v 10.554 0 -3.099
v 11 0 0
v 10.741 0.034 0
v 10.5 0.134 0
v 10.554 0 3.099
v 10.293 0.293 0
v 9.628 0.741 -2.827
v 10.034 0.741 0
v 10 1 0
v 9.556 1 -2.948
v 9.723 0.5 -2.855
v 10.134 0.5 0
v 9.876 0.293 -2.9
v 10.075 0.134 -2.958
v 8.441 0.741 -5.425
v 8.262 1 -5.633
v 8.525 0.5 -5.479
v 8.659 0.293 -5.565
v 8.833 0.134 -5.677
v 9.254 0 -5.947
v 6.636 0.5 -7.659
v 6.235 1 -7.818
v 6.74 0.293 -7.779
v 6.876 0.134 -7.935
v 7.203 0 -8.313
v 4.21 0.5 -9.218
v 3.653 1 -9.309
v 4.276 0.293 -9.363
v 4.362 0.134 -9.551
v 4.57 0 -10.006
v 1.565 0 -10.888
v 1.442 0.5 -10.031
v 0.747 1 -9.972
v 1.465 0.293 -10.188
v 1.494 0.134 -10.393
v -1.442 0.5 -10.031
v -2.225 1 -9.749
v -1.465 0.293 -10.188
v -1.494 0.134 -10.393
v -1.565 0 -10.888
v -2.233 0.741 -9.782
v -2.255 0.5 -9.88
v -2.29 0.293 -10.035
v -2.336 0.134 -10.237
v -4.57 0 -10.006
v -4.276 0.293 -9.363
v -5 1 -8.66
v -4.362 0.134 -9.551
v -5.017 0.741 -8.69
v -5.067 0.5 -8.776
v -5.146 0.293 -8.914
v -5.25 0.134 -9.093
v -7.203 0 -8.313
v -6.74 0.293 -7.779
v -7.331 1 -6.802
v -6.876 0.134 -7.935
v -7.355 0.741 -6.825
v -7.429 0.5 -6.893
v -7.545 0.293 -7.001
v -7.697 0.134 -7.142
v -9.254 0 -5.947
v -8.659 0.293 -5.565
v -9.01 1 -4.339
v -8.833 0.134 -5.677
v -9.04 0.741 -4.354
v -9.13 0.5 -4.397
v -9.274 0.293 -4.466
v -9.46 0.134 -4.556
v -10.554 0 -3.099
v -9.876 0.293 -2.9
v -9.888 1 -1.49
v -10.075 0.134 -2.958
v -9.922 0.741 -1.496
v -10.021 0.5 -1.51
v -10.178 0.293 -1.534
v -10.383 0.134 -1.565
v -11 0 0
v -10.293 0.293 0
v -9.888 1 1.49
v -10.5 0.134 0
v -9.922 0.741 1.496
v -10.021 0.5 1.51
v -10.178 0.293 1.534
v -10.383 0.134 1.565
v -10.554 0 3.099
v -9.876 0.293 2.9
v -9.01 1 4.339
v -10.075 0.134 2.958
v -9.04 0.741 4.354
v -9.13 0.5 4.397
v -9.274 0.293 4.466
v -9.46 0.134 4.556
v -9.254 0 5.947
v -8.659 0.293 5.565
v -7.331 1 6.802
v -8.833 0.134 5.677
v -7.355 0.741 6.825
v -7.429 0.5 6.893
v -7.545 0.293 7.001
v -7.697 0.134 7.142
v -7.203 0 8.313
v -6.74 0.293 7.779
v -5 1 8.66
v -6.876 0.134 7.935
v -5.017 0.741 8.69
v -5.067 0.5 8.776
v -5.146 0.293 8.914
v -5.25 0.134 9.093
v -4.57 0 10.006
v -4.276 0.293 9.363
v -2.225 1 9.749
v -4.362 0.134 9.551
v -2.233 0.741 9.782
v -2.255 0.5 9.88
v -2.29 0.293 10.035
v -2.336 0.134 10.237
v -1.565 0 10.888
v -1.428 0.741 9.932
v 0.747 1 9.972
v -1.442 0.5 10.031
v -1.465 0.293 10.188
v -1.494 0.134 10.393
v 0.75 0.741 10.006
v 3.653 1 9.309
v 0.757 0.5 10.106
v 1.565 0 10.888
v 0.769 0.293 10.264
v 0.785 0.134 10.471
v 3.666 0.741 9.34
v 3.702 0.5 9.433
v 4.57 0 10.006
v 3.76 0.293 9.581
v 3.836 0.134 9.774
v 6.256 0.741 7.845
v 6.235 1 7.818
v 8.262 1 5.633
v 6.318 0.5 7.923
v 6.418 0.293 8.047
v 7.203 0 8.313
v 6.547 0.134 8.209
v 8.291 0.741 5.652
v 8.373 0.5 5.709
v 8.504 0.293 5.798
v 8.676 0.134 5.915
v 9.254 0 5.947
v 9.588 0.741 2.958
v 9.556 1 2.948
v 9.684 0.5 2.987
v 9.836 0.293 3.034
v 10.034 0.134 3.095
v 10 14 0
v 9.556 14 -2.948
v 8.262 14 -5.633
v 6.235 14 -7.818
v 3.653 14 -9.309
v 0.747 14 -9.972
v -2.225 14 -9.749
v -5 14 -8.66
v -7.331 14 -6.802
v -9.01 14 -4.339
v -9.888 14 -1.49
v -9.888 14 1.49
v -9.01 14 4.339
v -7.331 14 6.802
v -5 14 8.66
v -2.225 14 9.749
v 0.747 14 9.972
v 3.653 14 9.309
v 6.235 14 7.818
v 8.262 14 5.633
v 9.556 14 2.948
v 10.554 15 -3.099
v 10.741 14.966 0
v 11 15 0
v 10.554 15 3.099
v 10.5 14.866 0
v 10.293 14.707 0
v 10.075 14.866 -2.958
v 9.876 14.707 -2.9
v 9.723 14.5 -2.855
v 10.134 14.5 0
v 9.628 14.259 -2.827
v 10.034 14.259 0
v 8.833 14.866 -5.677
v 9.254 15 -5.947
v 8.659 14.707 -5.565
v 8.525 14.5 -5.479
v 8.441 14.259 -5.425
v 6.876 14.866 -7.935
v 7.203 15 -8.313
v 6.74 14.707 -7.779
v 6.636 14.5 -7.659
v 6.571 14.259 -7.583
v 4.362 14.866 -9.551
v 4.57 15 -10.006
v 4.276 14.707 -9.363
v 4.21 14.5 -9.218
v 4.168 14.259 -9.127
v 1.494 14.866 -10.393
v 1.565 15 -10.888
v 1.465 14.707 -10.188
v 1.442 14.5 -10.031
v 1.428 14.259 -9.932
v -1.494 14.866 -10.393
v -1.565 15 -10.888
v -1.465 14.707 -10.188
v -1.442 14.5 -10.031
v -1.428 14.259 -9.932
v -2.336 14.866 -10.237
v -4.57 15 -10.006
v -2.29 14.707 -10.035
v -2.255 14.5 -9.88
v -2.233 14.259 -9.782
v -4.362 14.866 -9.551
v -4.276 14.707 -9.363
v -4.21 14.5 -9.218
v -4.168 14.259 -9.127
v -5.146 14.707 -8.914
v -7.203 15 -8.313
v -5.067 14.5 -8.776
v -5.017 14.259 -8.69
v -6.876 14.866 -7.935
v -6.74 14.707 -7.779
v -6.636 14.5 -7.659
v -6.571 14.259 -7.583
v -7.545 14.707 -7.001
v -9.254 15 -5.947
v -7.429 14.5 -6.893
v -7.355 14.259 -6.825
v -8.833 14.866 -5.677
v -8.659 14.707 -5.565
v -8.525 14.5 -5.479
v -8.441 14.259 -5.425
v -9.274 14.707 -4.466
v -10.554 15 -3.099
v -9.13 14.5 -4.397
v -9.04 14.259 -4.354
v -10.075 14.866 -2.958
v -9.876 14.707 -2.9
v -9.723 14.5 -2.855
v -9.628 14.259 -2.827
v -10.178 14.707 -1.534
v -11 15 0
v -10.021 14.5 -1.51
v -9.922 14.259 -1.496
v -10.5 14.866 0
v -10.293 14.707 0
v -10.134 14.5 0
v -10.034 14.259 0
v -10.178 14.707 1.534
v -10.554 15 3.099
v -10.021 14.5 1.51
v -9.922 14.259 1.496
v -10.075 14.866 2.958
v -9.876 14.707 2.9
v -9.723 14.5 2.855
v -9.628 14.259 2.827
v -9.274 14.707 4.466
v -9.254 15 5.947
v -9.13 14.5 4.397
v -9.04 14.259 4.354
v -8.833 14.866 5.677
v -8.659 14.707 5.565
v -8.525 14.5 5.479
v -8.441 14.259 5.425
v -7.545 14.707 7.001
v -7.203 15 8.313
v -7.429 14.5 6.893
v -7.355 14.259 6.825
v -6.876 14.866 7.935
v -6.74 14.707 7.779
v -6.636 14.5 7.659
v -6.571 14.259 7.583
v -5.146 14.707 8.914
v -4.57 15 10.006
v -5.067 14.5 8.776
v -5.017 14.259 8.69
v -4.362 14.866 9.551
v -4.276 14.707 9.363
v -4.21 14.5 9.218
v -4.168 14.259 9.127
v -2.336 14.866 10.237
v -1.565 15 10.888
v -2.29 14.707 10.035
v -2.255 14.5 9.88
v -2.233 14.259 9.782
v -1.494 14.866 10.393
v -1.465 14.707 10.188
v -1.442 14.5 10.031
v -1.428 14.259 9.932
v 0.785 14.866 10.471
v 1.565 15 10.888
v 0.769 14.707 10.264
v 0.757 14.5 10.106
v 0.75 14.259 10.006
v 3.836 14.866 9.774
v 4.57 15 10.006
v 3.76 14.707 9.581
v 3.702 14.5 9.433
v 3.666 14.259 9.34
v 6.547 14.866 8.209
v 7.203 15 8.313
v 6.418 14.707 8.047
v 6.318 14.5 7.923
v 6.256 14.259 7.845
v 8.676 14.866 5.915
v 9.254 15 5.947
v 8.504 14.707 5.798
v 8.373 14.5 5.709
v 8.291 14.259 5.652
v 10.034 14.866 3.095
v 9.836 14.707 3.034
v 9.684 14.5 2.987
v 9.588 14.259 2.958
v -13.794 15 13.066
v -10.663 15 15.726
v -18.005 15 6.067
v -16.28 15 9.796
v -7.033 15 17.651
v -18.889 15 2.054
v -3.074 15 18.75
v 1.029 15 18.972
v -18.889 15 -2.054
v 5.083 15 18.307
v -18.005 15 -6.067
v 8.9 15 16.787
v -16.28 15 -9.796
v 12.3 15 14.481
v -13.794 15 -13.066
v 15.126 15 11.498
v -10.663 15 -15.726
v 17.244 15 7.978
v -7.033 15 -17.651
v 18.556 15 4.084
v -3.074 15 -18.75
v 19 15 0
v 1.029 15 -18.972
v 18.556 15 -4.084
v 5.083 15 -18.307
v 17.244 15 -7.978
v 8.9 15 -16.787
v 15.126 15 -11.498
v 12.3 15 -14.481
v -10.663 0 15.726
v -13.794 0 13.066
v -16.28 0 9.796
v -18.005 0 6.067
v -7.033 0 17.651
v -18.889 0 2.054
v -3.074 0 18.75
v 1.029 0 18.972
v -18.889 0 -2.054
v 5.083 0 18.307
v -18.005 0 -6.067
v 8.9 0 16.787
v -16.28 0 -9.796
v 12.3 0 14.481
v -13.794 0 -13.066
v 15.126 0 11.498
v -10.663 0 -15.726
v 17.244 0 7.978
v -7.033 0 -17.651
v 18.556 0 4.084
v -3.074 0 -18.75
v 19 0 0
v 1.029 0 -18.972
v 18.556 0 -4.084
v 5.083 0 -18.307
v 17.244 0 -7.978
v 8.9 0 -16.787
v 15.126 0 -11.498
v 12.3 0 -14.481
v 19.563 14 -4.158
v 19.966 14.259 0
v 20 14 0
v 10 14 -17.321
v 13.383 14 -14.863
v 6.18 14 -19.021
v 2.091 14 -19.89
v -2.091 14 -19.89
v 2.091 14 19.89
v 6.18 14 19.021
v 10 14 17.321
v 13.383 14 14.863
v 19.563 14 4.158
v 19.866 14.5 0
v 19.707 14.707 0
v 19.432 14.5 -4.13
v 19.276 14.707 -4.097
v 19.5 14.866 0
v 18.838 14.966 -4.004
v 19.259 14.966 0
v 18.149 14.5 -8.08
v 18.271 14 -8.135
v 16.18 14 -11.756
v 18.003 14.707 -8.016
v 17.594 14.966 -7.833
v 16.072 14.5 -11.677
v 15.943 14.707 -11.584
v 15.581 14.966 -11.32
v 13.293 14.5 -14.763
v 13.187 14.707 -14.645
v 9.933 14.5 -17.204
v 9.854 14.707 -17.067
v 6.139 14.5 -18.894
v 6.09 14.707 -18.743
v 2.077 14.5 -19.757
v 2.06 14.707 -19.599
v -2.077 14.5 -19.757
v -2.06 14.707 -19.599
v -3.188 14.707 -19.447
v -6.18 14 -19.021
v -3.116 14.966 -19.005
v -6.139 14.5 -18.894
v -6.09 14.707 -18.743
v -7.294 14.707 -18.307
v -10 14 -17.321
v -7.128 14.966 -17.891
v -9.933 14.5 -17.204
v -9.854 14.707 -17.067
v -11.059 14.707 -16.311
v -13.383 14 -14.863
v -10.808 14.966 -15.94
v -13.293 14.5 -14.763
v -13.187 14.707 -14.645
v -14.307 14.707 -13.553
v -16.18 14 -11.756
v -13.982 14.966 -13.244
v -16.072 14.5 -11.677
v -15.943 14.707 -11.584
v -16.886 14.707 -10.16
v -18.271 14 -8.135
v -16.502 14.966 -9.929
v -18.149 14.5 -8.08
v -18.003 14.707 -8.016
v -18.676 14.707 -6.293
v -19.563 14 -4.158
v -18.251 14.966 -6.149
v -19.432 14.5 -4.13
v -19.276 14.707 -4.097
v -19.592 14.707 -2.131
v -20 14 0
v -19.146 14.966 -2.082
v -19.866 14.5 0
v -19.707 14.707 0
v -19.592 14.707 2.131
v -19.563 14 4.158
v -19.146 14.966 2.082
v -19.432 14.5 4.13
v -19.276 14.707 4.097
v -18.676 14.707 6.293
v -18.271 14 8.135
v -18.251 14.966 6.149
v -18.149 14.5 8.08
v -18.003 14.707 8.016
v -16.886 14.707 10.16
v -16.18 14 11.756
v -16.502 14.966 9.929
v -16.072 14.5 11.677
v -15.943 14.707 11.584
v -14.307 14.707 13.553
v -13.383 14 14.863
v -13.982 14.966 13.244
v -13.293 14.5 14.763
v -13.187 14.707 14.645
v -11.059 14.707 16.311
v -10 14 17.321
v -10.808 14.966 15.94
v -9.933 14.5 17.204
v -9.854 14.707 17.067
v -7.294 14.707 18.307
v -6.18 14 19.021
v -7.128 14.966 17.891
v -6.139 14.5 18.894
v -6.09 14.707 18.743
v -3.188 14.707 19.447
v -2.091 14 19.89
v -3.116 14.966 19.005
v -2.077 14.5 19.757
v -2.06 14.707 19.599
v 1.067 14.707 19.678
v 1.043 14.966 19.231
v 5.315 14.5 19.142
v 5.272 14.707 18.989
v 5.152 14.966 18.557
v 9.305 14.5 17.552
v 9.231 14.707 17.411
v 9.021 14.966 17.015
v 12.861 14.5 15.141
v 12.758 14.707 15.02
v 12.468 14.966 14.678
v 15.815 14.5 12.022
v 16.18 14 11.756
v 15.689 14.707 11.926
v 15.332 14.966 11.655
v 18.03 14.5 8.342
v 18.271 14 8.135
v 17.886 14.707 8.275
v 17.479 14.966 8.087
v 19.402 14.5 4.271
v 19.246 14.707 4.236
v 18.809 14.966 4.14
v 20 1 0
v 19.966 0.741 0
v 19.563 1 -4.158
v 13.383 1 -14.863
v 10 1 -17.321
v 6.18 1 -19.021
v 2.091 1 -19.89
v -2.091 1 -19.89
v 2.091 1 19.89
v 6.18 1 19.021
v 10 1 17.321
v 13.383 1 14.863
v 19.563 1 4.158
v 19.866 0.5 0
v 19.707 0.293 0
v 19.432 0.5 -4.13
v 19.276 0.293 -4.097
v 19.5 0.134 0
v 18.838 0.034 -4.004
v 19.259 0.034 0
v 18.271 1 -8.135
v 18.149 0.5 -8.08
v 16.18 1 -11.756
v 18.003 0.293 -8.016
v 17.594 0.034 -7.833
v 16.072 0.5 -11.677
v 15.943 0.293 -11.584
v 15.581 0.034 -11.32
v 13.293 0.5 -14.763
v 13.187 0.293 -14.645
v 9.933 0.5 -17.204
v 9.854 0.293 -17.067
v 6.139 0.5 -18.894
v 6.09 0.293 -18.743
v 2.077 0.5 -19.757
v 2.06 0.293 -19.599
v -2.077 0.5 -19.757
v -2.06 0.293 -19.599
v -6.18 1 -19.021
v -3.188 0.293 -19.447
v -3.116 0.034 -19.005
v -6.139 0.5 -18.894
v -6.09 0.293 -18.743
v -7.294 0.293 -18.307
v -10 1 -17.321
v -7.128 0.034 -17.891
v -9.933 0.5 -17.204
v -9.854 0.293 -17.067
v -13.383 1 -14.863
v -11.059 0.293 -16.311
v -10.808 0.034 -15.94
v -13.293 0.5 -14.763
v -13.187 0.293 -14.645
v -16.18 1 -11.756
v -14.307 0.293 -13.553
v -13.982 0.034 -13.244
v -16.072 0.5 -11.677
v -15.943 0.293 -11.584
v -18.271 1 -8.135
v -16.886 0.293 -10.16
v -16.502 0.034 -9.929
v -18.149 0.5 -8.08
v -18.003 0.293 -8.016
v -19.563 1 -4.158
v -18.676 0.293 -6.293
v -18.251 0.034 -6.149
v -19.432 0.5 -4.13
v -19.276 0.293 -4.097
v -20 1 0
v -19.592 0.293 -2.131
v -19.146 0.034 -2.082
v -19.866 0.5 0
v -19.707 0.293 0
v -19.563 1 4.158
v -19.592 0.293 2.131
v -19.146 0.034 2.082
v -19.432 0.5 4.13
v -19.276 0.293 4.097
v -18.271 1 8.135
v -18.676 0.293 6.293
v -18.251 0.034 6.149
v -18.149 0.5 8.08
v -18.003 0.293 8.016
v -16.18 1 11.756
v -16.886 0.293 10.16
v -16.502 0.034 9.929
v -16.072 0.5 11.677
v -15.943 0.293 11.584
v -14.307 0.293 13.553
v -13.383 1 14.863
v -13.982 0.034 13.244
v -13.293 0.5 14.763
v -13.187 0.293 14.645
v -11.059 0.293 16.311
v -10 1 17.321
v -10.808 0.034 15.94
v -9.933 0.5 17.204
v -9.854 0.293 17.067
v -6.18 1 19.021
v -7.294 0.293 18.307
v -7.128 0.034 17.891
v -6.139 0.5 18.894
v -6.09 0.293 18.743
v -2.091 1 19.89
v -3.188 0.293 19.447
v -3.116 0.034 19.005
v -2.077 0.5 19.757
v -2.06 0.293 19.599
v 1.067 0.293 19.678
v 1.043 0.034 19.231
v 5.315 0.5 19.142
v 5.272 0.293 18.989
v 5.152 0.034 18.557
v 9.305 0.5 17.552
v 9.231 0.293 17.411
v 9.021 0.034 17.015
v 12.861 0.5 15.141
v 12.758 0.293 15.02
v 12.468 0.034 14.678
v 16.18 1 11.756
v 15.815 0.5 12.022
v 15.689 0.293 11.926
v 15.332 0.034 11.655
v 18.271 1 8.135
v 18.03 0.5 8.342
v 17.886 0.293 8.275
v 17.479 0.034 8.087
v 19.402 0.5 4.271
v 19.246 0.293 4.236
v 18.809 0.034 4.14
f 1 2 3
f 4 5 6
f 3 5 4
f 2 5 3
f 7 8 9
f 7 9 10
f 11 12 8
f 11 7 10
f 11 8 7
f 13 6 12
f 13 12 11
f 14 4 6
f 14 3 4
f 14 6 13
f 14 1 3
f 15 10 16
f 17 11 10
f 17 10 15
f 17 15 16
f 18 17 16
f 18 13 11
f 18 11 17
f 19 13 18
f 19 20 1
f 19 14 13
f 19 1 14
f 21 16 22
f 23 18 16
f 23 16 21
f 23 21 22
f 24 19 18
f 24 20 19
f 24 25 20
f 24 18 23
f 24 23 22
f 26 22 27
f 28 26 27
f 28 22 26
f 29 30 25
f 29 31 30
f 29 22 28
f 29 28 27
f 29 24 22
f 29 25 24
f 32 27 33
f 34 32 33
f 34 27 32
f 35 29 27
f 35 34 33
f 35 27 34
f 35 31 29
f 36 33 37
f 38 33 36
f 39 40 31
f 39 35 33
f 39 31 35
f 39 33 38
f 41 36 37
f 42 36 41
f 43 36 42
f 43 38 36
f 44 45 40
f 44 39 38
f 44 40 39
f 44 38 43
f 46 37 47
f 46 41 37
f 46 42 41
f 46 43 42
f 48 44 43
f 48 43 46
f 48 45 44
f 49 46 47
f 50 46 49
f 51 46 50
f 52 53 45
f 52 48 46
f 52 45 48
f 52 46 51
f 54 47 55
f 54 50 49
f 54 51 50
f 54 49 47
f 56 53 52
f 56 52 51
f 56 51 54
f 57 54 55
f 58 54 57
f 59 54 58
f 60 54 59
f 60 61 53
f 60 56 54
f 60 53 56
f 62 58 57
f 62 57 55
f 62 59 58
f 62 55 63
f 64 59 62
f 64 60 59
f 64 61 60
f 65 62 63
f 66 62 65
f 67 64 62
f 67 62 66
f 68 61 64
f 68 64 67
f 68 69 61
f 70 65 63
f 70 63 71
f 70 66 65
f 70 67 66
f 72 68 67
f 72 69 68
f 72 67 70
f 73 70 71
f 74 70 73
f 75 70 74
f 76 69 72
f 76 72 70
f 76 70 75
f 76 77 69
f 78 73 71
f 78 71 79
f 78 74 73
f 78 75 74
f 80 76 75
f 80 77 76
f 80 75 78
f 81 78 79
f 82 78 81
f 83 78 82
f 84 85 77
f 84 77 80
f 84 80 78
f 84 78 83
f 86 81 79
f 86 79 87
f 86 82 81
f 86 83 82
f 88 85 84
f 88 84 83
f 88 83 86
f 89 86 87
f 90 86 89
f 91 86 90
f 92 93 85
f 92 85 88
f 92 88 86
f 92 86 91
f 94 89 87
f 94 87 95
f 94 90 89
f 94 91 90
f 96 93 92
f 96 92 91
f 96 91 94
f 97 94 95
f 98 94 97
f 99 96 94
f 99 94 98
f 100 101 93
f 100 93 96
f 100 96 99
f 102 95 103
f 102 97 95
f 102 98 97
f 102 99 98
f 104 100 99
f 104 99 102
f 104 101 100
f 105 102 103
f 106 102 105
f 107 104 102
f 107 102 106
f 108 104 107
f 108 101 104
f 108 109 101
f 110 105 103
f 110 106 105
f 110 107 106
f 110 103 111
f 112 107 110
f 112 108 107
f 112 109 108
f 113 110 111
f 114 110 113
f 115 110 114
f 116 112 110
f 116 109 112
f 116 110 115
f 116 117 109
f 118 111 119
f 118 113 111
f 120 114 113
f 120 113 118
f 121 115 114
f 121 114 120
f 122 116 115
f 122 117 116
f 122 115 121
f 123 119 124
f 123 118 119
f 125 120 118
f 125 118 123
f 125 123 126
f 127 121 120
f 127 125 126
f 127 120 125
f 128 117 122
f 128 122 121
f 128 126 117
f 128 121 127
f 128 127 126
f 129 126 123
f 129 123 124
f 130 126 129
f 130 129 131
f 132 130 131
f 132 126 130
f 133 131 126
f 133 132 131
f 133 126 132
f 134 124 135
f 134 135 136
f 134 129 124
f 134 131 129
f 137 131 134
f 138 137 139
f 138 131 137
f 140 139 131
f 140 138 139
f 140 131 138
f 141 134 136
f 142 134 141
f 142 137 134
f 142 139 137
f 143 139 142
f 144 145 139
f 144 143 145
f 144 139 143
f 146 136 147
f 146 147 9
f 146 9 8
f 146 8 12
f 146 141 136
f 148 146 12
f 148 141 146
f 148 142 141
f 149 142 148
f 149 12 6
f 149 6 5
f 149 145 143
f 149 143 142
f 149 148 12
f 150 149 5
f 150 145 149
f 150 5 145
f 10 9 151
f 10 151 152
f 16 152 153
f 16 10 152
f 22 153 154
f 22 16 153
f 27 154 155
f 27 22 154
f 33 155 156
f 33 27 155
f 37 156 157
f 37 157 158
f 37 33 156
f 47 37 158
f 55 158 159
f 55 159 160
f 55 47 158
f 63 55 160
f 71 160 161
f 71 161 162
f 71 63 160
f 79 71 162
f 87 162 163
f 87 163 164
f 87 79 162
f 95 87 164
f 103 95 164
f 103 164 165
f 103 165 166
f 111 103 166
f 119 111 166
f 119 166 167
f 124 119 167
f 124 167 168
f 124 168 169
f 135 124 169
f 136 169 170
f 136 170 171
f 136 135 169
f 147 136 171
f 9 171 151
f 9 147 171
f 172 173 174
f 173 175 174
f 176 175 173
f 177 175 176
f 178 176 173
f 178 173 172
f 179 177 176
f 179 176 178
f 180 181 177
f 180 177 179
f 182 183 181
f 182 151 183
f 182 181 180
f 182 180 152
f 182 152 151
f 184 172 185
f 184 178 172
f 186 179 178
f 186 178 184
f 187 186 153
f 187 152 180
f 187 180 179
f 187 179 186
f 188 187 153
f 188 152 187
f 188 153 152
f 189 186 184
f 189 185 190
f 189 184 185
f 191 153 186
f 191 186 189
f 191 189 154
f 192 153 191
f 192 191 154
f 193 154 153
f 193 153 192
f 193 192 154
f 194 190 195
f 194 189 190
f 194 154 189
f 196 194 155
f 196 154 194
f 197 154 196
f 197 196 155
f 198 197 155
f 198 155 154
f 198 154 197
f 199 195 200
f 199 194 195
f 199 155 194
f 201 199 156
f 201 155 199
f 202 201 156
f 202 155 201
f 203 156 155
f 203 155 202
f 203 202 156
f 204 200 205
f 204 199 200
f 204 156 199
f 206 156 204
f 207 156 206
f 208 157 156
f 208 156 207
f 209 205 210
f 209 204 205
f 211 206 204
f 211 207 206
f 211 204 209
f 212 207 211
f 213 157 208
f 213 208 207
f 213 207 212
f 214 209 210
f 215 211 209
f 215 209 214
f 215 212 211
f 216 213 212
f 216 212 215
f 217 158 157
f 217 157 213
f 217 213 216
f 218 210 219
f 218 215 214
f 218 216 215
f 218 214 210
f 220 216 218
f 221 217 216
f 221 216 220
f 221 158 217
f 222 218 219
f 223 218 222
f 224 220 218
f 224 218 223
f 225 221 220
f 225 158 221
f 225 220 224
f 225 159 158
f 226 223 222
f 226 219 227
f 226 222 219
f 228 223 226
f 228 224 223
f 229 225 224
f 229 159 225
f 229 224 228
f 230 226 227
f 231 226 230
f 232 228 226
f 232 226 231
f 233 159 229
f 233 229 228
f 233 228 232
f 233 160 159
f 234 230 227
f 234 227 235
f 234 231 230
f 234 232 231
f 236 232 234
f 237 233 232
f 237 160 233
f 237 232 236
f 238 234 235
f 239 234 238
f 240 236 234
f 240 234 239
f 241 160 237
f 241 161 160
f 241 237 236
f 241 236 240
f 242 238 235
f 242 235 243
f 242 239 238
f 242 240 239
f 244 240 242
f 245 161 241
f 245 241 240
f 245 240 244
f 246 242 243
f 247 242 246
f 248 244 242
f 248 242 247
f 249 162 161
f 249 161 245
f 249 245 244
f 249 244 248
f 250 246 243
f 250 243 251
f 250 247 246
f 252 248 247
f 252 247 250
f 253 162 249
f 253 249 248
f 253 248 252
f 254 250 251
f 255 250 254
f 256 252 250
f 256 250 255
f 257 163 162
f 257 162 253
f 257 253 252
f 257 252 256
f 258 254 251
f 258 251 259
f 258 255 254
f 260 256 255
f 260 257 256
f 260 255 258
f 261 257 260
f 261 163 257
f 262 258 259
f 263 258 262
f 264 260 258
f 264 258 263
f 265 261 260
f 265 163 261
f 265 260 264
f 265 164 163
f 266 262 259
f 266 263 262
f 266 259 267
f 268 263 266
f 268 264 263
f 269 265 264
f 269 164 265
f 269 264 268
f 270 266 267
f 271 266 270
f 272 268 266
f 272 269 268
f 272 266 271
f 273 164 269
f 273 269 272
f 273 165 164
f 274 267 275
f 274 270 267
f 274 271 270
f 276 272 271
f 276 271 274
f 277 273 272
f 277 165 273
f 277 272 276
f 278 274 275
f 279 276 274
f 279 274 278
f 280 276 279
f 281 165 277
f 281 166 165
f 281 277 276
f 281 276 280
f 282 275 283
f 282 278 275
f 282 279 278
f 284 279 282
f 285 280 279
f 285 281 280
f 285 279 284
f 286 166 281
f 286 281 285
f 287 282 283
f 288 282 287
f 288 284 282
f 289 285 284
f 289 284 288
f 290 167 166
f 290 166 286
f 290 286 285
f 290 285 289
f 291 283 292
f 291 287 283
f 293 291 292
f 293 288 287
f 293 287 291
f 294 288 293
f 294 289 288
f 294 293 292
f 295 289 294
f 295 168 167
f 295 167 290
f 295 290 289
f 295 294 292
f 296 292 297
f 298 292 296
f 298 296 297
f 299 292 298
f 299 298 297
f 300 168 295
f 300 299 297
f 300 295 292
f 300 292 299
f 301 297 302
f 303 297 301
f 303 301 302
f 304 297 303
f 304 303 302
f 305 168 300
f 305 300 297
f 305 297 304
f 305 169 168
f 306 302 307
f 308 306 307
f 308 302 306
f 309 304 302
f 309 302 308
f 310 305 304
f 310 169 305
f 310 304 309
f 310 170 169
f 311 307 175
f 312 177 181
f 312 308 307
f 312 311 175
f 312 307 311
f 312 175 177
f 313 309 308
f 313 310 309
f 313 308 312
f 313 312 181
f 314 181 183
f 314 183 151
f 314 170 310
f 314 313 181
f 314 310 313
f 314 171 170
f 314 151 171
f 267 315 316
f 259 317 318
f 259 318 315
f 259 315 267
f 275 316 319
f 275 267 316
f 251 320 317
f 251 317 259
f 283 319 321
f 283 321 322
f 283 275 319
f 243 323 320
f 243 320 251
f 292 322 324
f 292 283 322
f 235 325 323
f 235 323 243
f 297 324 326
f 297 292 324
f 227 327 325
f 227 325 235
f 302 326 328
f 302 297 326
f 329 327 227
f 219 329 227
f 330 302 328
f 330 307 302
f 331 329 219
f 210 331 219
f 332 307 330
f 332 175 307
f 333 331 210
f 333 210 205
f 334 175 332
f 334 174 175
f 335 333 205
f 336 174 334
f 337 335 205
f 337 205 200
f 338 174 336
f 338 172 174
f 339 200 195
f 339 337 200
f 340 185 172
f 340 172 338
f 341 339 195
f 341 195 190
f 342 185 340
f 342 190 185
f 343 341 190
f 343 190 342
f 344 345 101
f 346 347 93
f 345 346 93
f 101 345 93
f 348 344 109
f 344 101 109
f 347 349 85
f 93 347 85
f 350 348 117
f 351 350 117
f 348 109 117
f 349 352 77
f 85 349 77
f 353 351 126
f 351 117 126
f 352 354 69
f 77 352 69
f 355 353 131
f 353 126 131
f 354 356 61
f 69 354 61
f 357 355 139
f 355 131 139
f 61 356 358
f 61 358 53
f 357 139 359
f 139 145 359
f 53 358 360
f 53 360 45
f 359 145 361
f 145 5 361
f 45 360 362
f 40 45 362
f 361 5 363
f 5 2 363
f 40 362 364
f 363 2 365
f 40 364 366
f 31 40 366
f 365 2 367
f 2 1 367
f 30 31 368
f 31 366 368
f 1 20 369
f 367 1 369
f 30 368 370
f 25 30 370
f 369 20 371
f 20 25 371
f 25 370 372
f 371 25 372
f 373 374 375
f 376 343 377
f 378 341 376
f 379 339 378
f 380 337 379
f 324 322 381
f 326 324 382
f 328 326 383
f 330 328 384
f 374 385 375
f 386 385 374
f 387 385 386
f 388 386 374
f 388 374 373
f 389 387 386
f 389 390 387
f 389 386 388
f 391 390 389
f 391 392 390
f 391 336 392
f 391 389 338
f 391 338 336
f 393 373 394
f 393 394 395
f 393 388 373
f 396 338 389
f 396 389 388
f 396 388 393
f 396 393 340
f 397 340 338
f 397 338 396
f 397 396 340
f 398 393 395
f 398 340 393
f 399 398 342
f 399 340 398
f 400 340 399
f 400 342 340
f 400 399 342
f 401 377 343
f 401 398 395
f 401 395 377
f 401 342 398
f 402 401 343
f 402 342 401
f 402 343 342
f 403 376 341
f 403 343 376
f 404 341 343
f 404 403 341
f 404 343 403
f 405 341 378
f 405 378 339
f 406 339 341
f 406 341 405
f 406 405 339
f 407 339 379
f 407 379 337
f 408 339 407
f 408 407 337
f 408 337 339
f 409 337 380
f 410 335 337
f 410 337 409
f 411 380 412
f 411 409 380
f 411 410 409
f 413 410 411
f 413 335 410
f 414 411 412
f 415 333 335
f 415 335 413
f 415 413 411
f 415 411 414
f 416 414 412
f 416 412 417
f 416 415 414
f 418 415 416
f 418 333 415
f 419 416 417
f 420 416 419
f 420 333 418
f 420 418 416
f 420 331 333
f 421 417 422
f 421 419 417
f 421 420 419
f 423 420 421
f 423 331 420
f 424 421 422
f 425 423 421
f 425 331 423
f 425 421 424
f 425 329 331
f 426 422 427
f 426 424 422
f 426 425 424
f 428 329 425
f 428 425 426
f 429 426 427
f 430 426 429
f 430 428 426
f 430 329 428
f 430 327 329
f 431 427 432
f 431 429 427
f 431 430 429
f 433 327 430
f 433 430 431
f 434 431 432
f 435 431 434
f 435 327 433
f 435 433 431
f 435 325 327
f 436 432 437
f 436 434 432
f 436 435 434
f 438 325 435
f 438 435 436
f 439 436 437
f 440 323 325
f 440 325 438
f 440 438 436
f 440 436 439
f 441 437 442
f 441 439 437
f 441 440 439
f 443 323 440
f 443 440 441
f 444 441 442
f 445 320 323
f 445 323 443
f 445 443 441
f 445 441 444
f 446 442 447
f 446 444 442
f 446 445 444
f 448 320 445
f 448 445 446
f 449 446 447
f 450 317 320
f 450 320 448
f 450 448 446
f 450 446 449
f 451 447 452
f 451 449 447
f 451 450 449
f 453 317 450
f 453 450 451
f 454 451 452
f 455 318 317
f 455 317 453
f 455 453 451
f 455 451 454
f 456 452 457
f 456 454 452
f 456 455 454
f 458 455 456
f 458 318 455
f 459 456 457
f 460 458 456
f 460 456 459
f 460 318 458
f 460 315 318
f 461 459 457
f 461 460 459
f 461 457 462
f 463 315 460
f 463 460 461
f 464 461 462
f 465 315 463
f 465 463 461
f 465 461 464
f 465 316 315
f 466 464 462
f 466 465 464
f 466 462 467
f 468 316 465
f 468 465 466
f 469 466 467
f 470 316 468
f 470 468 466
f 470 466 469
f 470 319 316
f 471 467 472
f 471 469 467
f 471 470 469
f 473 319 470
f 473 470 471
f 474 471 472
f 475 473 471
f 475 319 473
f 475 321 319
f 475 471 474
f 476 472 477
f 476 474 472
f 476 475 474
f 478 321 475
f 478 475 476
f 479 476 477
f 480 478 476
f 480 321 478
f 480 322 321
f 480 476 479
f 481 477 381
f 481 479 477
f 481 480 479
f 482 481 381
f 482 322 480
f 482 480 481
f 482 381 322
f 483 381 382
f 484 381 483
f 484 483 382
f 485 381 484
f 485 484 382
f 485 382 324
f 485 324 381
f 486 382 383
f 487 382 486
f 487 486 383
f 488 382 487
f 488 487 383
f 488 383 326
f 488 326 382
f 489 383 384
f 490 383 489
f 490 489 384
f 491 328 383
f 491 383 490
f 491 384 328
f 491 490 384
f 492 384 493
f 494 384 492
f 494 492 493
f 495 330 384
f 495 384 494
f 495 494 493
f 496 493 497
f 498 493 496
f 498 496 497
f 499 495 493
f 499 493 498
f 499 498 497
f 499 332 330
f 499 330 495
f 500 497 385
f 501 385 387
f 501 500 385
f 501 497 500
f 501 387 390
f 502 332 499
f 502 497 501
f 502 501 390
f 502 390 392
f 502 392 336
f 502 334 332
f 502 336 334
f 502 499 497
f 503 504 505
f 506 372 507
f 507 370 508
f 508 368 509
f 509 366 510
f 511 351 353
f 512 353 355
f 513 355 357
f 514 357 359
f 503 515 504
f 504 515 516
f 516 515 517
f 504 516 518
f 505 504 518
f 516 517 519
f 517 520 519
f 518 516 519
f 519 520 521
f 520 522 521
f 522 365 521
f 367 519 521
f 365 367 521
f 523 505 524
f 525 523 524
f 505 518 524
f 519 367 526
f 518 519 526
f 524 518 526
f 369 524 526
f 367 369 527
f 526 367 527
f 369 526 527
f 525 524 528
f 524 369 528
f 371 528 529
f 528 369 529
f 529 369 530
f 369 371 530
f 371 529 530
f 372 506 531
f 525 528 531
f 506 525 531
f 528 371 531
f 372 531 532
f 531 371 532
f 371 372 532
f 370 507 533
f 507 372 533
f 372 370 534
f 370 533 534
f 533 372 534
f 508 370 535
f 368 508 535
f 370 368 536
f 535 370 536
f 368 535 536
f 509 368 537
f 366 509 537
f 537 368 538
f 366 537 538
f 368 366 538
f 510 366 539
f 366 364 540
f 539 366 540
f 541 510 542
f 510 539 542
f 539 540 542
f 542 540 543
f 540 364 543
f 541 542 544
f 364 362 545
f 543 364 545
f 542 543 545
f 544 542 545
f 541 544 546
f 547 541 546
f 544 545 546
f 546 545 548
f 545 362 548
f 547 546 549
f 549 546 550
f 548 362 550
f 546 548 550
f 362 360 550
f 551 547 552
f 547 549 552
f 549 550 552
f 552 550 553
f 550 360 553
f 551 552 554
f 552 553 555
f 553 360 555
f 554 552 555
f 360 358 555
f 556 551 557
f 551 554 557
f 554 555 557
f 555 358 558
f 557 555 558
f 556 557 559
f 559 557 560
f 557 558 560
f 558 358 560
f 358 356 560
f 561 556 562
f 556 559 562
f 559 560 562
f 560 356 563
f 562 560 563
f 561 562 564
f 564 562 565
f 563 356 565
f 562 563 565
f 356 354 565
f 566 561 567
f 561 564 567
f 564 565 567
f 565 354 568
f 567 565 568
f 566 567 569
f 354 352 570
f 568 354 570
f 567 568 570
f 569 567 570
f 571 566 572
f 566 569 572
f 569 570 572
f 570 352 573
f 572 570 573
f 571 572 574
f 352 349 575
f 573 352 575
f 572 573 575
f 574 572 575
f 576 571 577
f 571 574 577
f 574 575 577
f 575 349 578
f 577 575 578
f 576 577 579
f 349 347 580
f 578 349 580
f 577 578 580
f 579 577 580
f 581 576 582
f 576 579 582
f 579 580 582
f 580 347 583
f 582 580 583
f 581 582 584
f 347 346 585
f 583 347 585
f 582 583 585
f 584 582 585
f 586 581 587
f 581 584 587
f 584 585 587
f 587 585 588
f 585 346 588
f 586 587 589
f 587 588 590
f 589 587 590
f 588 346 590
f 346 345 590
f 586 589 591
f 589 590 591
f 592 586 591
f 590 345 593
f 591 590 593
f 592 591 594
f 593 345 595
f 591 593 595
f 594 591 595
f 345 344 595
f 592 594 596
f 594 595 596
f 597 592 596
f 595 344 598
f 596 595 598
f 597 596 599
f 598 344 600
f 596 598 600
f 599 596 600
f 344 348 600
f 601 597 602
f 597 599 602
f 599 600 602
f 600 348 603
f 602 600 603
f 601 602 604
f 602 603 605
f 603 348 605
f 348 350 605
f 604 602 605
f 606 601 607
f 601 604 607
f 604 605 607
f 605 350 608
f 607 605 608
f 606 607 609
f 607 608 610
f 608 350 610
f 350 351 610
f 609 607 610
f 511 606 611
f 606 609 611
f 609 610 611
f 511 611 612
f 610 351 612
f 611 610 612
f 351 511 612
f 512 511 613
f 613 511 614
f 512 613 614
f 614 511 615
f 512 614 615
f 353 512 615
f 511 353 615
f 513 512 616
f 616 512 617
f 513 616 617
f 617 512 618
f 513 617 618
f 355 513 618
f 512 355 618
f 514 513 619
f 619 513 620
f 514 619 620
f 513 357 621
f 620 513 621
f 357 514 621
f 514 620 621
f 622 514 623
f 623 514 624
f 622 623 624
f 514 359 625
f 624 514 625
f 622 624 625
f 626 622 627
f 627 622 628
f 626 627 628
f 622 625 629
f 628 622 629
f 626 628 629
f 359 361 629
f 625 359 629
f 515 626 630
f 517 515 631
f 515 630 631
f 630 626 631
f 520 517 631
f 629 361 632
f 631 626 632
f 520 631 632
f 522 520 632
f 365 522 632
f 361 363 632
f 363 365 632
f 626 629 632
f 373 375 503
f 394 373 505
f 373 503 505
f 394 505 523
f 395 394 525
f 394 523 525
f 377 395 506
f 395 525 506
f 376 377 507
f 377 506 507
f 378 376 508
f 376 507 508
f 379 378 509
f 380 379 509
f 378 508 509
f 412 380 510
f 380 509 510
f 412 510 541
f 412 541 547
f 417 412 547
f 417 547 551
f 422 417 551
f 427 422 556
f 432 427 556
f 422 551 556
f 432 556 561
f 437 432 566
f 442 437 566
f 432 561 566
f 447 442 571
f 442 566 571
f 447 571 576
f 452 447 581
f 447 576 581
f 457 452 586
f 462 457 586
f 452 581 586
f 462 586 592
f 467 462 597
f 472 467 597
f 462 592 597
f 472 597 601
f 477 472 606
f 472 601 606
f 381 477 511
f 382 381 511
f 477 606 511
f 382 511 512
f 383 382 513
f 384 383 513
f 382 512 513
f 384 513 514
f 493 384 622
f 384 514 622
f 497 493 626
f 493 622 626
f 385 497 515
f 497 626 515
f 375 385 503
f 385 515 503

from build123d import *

# Parameters (mm, degrees)
SKETCH1_R           = 20
SKETCH1_R_2         = 10
BOSS_EXTRUDE2_DEPTH = 15
FILLET1_R           = 1
FILLET2_R           = 1
FILLET3_R           = 1


with BuildPart() as part:
    # Sketch1 → Boss-Extrude2 (new body)
    with BuildSketch(Plane(origin=(0, 0, 0), x_dir=(1, 0, 0), z_dir=(0, 1, 0))):
        Circle(SKETCH1_R)
        Circle(SKETCH1_R_2, mode=Mode.SUBTRACT)
    extrude(amount=BOSS_EXTRUDE2_DEPTH)

    # Fillet1
    fillet1_edges = [part.edges().sort_by_distance(p)[0] for p in [
        (-20, 15, 0),
    ]]
    fillet(fillet1_edges, radius=FILLET1_R)

    # Fillet2
    fillet2_edges = [part.edges().sort_by_distance(p)[0] for p in [
        (-10, 15, 0),
    ]]
    fillet(fillet2_edges, radius=FILLET2_R)

    # Fillet3
    fillet3_edges = [part.edges().sort_by_distance(p)[0] for p in [
        (-20, 0, 0),
        (-10, 0, 0),
    ]]
    fillet(fillet3_edges, radius=FILLET3_R)


solid = part.part
